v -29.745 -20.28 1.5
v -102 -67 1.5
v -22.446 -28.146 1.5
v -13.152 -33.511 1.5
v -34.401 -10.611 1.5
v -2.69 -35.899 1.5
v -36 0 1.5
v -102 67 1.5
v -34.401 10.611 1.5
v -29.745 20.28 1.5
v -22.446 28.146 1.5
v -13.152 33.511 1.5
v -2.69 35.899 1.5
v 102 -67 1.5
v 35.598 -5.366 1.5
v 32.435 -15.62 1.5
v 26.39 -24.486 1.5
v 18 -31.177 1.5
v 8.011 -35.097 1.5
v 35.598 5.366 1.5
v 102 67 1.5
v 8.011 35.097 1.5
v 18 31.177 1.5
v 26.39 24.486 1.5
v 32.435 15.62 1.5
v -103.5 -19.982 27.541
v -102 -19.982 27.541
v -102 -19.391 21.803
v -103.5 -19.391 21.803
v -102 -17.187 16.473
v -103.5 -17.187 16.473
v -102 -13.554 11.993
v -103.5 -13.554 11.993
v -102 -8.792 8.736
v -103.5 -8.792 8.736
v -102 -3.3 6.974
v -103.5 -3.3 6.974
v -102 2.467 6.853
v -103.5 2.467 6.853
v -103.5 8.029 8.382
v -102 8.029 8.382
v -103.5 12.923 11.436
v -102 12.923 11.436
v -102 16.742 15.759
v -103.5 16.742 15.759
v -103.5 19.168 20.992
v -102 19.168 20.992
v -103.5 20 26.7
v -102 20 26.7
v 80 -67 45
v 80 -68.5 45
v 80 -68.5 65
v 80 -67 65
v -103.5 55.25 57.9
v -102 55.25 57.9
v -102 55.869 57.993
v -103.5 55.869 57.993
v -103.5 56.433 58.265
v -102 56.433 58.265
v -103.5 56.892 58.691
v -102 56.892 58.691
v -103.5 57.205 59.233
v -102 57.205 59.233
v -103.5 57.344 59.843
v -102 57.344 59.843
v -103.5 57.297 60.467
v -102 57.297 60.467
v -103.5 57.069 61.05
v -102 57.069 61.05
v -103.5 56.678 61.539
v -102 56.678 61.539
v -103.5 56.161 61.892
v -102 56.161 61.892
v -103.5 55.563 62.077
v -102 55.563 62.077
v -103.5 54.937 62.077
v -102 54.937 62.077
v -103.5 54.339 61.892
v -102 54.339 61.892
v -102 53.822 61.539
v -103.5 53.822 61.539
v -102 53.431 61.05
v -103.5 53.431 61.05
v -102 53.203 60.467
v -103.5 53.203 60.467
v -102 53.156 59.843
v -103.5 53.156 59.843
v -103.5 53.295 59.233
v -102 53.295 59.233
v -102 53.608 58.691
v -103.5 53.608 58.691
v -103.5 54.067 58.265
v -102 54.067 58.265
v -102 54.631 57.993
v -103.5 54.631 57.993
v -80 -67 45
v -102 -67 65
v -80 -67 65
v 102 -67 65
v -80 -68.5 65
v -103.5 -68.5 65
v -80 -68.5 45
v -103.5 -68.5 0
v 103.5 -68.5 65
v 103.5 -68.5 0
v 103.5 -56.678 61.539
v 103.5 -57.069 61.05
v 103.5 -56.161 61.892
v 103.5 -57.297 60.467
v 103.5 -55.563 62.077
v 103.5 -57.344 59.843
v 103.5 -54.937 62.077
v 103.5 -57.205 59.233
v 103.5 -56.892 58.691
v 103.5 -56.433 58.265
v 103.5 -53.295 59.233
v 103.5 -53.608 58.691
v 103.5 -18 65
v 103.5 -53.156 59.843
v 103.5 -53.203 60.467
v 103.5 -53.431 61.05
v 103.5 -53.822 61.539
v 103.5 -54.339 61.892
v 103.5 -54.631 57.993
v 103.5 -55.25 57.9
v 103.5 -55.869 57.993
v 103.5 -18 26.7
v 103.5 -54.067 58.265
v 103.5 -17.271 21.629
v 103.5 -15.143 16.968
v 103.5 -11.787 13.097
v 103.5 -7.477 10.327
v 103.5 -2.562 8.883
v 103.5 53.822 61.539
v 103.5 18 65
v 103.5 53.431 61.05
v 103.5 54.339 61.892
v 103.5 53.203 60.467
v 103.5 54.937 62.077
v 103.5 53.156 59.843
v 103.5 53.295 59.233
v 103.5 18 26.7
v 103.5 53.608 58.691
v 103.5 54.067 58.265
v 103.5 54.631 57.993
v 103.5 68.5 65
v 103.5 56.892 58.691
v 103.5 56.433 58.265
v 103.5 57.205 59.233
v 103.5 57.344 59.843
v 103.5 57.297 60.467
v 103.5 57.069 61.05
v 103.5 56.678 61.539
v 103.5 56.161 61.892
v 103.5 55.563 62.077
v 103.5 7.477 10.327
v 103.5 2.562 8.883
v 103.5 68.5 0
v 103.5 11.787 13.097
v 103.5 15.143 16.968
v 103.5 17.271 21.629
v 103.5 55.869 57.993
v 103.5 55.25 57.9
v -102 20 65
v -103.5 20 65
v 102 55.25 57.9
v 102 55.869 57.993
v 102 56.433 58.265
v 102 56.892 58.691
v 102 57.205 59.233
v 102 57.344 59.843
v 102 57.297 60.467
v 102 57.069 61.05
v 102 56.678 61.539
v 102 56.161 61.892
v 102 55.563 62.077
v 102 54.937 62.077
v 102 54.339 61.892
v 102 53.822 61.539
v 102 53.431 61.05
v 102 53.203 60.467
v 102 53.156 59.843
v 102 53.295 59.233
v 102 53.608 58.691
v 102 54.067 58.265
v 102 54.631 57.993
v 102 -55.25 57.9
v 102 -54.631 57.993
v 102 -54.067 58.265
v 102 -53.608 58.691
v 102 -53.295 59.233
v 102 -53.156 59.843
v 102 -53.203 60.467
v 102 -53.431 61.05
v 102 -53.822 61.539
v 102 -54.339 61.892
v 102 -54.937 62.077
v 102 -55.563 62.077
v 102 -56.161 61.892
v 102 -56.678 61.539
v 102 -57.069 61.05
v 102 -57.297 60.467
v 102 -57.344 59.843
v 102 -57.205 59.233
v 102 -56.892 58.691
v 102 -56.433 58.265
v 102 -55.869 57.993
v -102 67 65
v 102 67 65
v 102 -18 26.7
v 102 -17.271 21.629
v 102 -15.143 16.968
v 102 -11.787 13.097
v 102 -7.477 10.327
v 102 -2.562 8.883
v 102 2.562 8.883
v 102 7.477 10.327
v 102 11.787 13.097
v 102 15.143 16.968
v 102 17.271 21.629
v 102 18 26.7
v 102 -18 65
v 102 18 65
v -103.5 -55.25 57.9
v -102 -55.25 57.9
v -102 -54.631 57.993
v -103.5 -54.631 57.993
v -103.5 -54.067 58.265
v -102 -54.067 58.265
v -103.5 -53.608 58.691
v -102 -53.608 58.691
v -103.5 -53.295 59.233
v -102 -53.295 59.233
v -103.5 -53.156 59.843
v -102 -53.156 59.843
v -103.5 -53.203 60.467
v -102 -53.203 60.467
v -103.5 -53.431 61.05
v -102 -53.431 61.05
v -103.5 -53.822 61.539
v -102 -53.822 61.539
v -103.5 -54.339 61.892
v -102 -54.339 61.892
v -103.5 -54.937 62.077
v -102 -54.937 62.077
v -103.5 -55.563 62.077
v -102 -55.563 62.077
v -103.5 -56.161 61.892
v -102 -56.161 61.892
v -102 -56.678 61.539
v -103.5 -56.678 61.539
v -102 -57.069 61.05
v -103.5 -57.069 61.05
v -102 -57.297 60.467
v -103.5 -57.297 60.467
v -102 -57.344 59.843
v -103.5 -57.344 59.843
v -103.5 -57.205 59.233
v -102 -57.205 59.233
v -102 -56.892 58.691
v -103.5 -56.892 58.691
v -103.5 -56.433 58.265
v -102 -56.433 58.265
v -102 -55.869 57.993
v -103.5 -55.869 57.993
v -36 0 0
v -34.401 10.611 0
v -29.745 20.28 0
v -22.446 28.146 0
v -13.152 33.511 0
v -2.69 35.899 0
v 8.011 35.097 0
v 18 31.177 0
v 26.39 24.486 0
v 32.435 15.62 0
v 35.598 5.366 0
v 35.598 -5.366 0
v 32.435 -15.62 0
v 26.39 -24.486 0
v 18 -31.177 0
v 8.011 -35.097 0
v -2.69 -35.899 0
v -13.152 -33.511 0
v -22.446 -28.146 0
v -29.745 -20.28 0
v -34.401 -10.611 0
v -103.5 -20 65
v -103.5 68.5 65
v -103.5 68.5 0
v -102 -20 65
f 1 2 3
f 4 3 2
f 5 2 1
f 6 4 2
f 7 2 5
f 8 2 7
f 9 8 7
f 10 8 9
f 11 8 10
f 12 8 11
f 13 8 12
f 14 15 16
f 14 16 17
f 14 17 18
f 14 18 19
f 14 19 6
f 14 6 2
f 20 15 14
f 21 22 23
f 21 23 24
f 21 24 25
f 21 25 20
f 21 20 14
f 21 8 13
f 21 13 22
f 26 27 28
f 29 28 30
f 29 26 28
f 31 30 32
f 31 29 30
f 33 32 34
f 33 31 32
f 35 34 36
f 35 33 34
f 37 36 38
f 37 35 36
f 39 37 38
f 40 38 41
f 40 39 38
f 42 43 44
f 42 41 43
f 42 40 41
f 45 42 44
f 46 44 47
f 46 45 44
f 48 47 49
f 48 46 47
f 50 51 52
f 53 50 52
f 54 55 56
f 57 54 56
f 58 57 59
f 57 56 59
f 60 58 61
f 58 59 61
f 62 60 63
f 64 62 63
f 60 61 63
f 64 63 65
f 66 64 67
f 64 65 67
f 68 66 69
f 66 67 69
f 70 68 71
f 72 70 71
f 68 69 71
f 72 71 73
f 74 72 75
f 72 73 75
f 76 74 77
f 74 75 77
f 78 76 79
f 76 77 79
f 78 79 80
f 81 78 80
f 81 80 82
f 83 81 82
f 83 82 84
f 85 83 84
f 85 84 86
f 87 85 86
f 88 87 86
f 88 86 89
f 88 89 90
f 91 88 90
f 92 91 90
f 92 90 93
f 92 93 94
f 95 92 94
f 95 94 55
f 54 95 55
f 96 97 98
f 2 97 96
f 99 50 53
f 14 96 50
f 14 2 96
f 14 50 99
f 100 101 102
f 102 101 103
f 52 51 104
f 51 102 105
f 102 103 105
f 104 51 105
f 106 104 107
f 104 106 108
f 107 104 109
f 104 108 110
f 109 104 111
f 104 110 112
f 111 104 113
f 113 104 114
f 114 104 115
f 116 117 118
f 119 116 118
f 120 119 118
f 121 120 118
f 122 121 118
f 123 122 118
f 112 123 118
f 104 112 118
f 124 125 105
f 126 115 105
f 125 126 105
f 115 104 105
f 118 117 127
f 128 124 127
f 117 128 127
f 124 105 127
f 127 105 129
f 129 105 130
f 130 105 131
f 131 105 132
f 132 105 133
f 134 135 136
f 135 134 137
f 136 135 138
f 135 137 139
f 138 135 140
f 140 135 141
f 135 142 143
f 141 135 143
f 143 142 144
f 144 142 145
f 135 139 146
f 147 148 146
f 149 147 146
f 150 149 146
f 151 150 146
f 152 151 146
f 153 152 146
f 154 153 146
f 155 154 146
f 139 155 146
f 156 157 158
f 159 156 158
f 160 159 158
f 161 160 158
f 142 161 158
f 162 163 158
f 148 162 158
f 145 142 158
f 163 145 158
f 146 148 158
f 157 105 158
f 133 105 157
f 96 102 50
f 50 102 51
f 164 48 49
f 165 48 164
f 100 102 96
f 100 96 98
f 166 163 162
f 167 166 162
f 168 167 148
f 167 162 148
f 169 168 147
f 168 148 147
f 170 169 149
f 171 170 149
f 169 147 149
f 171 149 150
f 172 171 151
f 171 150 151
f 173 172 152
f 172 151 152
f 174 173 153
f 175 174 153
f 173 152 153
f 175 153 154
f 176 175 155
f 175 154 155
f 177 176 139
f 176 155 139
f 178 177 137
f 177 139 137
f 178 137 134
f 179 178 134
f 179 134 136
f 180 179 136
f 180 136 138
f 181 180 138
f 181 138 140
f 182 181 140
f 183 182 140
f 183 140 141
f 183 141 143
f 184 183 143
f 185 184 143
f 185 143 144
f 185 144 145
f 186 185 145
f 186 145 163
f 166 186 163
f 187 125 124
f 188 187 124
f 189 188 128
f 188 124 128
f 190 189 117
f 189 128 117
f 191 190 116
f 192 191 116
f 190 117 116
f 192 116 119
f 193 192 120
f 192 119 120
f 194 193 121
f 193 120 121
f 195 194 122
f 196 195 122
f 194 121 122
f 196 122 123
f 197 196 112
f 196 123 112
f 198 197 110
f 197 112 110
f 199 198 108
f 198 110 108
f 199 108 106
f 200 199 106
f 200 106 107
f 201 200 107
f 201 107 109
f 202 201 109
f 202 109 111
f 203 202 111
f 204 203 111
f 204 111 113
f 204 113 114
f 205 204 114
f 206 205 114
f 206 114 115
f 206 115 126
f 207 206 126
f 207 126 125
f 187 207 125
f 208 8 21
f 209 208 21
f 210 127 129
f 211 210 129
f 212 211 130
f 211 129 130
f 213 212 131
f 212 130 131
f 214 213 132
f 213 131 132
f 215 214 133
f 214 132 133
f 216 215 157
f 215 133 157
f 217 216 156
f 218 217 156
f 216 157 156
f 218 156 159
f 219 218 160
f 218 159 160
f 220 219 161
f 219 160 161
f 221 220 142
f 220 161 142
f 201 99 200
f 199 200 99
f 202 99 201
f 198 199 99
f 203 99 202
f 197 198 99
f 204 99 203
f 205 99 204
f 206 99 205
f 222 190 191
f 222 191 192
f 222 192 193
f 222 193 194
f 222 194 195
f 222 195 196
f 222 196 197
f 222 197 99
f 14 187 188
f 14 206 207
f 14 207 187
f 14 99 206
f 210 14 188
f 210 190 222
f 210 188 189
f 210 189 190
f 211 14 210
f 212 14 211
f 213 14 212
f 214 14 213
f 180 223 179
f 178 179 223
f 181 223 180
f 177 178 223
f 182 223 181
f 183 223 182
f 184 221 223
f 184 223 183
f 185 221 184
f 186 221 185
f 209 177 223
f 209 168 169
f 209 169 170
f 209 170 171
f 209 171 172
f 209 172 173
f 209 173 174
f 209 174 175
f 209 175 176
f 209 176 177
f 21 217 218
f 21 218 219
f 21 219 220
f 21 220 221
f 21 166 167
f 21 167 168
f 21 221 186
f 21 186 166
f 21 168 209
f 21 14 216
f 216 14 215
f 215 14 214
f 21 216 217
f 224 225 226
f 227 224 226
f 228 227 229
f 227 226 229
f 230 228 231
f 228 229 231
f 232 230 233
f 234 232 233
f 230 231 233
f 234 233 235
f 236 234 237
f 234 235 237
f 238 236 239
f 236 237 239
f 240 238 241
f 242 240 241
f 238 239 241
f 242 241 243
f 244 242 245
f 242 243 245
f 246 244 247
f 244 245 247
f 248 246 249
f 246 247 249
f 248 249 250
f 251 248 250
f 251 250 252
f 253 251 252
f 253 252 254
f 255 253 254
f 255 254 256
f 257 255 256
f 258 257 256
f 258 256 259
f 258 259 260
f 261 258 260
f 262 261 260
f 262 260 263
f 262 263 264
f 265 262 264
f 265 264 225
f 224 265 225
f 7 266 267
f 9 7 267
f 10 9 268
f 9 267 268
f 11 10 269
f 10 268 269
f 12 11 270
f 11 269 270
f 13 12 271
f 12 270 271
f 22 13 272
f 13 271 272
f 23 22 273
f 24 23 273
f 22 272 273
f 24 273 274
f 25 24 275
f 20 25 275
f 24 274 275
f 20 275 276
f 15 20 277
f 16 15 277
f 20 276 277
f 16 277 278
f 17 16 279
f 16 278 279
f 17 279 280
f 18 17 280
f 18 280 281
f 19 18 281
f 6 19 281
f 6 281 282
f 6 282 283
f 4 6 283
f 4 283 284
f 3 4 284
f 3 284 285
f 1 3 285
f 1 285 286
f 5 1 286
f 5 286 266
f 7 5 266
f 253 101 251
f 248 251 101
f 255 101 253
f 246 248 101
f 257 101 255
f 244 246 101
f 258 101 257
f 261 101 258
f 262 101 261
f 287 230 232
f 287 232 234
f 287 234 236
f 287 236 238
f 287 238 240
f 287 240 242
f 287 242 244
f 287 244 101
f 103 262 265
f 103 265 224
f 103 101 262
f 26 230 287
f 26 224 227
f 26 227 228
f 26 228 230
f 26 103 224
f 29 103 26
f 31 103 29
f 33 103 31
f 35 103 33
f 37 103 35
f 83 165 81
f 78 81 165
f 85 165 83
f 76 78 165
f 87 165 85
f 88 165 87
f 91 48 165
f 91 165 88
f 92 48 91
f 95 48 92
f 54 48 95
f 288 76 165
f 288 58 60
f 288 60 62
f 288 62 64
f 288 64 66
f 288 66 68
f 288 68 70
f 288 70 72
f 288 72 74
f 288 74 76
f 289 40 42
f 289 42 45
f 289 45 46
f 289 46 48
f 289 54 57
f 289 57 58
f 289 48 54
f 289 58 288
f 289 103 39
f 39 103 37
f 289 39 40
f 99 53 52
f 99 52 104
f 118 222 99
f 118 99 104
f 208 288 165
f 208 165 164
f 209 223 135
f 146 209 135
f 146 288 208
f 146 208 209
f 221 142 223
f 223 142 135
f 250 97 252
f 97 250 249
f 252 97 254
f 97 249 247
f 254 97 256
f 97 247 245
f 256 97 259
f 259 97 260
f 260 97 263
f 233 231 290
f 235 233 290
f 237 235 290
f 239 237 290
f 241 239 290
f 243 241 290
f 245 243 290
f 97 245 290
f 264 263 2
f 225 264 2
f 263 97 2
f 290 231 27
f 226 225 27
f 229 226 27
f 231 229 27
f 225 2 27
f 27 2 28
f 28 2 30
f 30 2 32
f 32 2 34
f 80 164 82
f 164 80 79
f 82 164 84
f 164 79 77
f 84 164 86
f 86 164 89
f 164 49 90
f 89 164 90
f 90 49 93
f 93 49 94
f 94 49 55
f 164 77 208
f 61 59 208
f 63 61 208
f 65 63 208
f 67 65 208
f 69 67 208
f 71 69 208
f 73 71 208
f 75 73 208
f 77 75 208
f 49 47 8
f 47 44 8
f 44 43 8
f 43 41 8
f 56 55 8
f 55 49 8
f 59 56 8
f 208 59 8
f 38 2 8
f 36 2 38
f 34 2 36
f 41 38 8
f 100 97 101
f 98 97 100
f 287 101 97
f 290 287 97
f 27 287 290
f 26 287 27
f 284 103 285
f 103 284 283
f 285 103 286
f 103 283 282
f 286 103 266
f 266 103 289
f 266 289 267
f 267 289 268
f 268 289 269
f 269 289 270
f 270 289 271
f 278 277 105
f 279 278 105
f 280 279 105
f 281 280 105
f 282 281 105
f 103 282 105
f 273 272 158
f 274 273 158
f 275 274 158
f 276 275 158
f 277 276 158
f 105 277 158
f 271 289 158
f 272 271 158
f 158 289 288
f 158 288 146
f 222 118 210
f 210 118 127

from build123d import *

# Parameters (mm, degrees)
SKETCH_1_W                      = 207
SKETCH_1_H                      = 137
EXTRUDE_1_DEPTH                 = 65
SHELL_1_T                       = -1.5
SKETCH_2_R                      = 36
CUT_EXTRUDE_1_DEPTH             = 80
CUT_EXTRUDE_2_REACH             = 229.522
CUT_EXTRUDE_3_REACH             = 229.522
CUT_EXTRUDE_3_DIRECTION_2_DEPTH = 228.52197696
HOLE_WIZARD_M5_3_D              = 4.2
CUT_EXTRUDE_4_REACH             = 185.593
SKETCH_6_W                      = 160
SKETCH_6_H                      = 20


with BuildPart() as part:
    # 草图1 → 凸台-拉伸1 (new body)
    with BuildSketch(Plane.XY):
        Rectangle(SKETCH_1_W, SKETCH_1_H)
    extrude(amount=EXTRUDE_1_DEPTH)

    # 抽壳1
    shell_1_openings = [part.faces().sort_by_distance(p)[0] for p in [
        (0, 0, 65),
    ]]
    offset(amount=SHELL_1_T, openings=shell_1_openings, kind=Kind.INTERSECTION)

    # 草图2 → 切除-拉伸1 (cut)
    with BuildSketch(Plane(origin=(0, 0, 0), x_dir=(-1, 0, 0), z_dir=(0, 0, -1))):
        Circle(SKETCH_2_R)
    extrude(amount=-CUT_EXTRUDE_1_DEPTH, mode=Mode.SUBTRACT)

    # 草图4 → 切除-拉伸2 (cut, up to next)
    with BuildSketch(Plane(origin=(103.5, 0, 0), x_dir=(0, 0, -1), z_dir=(1, 0, 0)), mode=Mode.PRIVATE) as cut_extrude_2_sk1:
        with BuildLine():
            Line((-26.7, 18), (-65, 18))
            Line((-65, 18), (-65, -18))
            Line((-65, -18), (-26.7, -18))
            ThreePointArc((-26.7, -18), (-8.7, 0), (-26.7, 18))
        make_face()
    cut_extrude_2_tool1 = extrude(cut_extrude_2_sk1.sketch, amount=-CUT_EXTRUDE_2_REACH, mode=Mode.PRIVATE) & part.part
    add(cut_extrude_2_tool1.solids().sort_by_distance((103.5, 0, 38.627513))[0], mode=Mode.SUBTRACT)

    # 草图5 → 切除-拉伸3 (cut, up to next)
    with BuildSketch(Plane.ZY.offset(103.5), mode=Mode.PRIVATE) as cut_extrude_3_sk1:
        with BuildLine():
            Line((26.7, 20), (65, 20))
            Line((65, 20), (65, -20))
            Line((65, -20), (27.541433506, -19.982291902))
            ThreePointArc((27.541433506, -19.982291902), (6.704427515, -0.42080991), (26.7, 20))
        make_face()
    cut_extrude_3_tool1 = extrude(cut_extrude_3_sk1.sketch, amount=-CUT_EXTRUDE_3_REACH, mode=Mode.PRIVATE) & part.part
    add(cut_extrude_3_tool1.solids().sort_by_distance((-103.5, 0.003116, 37.811224))[0], mode=Mode.SUBTRACT)

    # 草图5 → 切除-拉伸3 direction 2 (cut)
    with BuildSketch(Plane.ZY.offset(103.5)):
        with BuildLine():
            Line((26.7, 20), (65, 20))
            Line((65, 20), (65, -20))
            Line((65, -20), (27.541433506, -19.982291902))
            ThreePointArc((27.541433506, -19.982291902), (6.704427515, -0.42080991), (26.7, 20))
        make_face()
    extrude(amount=CUT_EXTRUDE_3_DIRECTION_2_DEPTH, mode=Mode.SUBTRACT)

    # M5 螺纹槽口的螺纹槽口钻头3 (through all)
    with Locations(Plane.ZY.offset(103.5)):
        with Locations((60, 55.25), (60, -55.25)):
            Hole(HOLE_WIZARD_M5_3_D / 2)

    # 草图6 → 切除-拉伸4 (cut, up to next)
    with BuildSketch(Plane.XZ.offset(68.5), mode=Mode.PRIVATE) as cut_extrude_4_sk1:
        with Locations((0, 55)):
            Rectangle(SKETCH_6_W, SKETCH_6_H)
    cut_extrude_4_tool1 = extrude(cut_extrude_4_sk1.sketch, amount=-CUT_EXTRUDE_4_REACH, mode=Mode.PRIVATE) & part.part
    add(cut_extrude_4_tool1.solids().sort_by_distance((0, -68.5, 55))[0], mode=Mode.SUBTRACT)


solid = part.part
